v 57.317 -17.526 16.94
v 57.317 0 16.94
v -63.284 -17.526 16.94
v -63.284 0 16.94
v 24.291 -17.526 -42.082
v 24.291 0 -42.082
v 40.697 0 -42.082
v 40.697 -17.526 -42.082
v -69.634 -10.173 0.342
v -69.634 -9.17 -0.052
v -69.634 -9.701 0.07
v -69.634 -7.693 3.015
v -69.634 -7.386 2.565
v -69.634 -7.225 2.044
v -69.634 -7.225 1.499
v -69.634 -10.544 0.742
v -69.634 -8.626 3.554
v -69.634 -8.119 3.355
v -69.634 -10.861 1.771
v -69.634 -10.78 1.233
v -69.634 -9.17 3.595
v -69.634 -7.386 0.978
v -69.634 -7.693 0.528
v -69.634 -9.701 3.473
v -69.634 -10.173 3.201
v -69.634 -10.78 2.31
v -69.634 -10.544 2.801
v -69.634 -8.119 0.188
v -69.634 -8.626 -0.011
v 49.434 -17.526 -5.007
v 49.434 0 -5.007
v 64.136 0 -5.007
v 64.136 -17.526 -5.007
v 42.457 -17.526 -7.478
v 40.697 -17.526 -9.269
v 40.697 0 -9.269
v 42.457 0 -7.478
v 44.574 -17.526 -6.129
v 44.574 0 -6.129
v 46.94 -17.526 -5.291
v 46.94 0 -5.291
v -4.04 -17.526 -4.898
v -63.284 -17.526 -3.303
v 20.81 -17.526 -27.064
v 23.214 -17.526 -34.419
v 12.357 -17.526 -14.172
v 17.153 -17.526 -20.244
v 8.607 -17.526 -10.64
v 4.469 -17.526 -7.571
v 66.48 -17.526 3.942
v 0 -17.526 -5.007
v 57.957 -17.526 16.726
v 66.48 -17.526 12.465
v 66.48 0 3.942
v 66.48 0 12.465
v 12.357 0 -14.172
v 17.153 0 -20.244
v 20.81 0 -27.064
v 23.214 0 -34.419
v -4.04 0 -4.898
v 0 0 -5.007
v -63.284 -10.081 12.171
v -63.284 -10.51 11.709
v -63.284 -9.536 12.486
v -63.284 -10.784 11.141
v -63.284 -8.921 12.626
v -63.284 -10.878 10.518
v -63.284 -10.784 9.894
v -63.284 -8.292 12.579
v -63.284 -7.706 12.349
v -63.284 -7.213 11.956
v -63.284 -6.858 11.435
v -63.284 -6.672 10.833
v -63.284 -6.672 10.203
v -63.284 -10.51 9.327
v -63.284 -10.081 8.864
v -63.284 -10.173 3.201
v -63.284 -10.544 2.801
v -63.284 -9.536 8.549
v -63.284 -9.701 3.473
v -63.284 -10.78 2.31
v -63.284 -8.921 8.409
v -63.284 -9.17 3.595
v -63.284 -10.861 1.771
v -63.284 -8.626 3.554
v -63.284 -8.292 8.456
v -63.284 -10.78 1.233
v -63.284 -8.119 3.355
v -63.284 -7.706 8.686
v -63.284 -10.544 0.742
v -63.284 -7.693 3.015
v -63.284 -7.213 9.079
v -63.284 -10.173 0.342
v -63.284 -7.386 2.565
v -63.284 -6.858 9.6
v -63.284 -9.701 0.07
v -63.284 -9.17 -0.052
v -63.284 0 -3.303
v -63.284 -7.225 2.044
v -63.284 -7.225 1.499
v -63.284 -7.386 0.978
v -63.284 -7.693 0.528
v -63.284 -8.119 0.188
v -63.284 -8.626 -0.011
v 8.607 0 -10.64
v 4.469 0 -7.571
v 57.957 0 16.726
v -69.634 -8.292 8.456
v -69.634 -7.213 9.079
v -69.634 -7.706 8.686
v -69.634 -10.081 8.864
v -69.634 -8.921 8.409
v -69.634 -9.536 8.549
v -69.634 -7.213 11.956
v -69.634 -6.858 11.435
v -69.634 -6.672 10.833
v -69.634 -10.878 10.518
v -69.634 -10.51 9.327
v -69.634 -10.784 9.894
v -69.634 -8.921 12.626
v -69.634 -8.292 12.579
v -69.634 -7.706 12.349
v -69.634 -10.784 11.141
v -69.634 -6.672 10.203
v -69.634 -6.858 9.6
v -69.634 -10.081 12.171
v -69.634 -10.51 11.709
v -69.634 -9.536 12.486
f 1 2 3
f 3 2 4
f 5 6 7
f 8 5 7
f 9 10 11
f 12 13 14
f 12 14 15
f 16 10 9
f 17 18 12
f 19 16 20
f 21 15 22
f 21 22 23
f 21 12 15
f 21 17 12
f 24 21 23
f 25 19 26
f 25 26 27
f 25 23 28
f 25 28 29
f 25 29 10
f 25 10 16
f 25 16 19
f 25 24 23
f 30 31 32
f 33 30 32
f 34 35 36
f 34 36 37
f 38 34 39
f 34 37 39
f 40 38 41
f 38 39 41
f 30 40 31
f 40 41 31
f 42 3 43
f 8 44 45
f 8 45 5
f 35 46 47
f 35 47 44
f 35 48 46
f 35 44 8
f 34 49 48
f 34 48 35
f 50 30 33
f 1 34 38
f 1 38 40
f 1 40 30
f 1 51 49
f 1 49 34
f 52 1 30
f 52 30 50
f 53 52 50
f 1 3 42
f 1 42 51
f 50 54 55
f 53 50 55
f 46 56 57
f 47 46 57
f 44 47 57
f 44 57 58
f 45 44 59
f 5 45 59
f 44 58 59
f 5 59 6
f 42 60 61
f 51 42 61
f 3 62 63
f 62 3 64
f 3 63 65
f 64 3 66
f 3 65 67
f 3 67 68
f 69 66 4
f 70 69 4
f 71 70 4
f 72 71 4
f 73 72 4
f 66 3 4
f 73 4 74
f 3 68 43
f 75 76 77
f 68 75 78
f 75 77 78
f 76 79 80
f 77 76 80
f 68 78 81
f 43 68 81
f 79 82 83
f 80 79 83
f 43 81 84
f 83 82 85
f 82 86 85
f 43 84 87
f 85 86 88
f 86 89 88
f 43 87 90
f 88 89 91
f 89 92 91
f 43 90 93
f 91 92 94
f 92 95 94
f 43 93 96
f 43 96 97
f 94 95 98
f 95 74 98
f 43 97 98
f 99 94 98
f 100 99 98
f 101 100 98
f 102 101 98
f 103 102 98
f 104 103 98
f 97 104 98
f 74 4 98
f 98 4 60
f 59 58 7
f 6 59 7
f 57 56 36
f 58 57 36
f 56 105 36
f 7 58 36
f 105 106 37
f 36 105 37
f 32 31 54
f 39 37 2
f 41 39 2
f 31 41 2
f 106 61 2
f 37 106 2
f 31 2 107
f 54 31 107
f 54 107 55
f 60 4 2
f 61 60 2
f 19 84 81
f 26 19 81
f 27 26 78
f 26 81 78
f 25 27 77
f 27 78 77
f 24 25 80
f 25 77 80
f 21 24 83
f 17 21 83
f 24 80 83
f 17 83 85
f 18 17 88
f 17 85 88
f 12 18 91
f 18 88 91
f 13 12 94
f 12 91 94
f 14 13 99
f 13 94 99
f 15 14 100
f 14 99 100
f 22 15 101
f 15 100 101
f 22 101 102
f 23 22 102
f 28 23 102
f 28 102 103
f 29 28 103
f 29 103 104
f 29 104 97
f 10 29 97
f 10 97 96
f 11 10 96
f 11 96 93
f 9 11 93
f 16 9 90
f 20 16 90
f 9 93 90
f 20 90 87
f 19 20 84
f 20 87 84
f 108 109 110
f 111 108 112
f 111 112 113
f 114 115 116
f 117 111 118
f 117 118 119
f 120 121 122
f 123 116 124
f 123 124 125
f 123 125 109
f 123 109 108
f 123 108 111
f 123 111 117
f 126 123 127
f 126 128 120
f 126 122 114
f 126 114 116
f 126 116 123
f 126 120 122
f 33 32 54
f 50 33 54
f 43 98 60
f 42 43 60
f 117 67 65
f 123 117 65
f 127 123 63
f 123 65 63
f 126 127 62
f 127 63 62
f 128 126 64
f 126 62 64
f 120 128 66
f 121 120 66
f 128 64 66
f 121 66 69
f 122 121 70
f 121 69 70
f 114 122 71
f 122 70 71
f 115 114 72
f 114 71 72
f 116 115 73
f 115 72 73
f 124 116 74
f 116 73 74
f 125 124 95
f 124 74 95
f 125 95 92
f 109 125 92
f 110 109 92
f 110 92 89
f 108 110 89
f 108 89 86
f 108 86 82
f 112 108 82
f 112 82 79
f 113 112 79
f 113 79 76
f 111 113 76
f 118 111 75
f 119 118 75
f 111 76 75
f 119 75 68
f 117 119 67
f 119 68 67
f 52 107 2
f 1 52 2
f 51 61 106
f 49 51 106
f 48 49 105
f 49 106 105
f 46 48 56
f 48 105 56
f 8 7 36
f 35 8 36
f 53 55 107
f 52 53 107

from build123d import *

# Parameters (mm, degrees)
F1_DEPTH = 17.526
F2_R     = 2.11459
F2_R_2   = 1.828308
F3_DEPTH = 6.35


with BuildPart() as f1:
    # F0 (on Front) → F1 (new body)
    with BuildSketch(Plane.XZ):
        with BuildLine():
            ThreePointArc((12.356936, -14.171695), (20.810401, -27.063904), (24.290653, -42.082492))
            Line((24.290653, -42.082492), (40.697493, -42.082492))
            Line((40.697493, -42.082492), (40.697493, -9.268802))
            ThreePointArc((40.697493, -9.268802), (44.57356, -6.129463), (49.433608, -5.007284))
            Line((49.433608, -5.007284), (64.135849, -5.007284))
            Line((64.135849, -5.007284), (66.479683, 3.941904))
            Line((66.479683, 3.941904), (66.479683, 12.464941))
            Line((66.479683, 12.464941), (57.956647, 16.726458))
            Line((57.956647, 16.726458), (57.317417, 16.939534))
            Line((57.317417, 16.939534), (-63.28354, 16.939534))
            Line((-63.28354, 16.939534), (-63.28354, -3.302676))
            Line((-63.28354, -3.302676), (-4.039772, -4.898468))
            Line((-4.039772, -4.898468), (0, -5.007284))
            ThreePointArc((0, -5.007284), (6.582655, -9.044499), (12.356936, -14.171695))
        make_face()
    extrude(amount=F1_DEPTH)

    # F2 (on face) → F3 (join)
    with BuildSketch(Plane(origin=(-63.28354, 0, 0), x_dir=(0, -1, 0), z_dir=(-1, 0, 0))):
        with Locations((8.763, 10.517745)):
            Circle(F2_R)
        with Locations((9.03319, 1.771447)):
            Circle(F2_R_2)
    extrude(amount=F3_DEPTH)


solid = f1.part
